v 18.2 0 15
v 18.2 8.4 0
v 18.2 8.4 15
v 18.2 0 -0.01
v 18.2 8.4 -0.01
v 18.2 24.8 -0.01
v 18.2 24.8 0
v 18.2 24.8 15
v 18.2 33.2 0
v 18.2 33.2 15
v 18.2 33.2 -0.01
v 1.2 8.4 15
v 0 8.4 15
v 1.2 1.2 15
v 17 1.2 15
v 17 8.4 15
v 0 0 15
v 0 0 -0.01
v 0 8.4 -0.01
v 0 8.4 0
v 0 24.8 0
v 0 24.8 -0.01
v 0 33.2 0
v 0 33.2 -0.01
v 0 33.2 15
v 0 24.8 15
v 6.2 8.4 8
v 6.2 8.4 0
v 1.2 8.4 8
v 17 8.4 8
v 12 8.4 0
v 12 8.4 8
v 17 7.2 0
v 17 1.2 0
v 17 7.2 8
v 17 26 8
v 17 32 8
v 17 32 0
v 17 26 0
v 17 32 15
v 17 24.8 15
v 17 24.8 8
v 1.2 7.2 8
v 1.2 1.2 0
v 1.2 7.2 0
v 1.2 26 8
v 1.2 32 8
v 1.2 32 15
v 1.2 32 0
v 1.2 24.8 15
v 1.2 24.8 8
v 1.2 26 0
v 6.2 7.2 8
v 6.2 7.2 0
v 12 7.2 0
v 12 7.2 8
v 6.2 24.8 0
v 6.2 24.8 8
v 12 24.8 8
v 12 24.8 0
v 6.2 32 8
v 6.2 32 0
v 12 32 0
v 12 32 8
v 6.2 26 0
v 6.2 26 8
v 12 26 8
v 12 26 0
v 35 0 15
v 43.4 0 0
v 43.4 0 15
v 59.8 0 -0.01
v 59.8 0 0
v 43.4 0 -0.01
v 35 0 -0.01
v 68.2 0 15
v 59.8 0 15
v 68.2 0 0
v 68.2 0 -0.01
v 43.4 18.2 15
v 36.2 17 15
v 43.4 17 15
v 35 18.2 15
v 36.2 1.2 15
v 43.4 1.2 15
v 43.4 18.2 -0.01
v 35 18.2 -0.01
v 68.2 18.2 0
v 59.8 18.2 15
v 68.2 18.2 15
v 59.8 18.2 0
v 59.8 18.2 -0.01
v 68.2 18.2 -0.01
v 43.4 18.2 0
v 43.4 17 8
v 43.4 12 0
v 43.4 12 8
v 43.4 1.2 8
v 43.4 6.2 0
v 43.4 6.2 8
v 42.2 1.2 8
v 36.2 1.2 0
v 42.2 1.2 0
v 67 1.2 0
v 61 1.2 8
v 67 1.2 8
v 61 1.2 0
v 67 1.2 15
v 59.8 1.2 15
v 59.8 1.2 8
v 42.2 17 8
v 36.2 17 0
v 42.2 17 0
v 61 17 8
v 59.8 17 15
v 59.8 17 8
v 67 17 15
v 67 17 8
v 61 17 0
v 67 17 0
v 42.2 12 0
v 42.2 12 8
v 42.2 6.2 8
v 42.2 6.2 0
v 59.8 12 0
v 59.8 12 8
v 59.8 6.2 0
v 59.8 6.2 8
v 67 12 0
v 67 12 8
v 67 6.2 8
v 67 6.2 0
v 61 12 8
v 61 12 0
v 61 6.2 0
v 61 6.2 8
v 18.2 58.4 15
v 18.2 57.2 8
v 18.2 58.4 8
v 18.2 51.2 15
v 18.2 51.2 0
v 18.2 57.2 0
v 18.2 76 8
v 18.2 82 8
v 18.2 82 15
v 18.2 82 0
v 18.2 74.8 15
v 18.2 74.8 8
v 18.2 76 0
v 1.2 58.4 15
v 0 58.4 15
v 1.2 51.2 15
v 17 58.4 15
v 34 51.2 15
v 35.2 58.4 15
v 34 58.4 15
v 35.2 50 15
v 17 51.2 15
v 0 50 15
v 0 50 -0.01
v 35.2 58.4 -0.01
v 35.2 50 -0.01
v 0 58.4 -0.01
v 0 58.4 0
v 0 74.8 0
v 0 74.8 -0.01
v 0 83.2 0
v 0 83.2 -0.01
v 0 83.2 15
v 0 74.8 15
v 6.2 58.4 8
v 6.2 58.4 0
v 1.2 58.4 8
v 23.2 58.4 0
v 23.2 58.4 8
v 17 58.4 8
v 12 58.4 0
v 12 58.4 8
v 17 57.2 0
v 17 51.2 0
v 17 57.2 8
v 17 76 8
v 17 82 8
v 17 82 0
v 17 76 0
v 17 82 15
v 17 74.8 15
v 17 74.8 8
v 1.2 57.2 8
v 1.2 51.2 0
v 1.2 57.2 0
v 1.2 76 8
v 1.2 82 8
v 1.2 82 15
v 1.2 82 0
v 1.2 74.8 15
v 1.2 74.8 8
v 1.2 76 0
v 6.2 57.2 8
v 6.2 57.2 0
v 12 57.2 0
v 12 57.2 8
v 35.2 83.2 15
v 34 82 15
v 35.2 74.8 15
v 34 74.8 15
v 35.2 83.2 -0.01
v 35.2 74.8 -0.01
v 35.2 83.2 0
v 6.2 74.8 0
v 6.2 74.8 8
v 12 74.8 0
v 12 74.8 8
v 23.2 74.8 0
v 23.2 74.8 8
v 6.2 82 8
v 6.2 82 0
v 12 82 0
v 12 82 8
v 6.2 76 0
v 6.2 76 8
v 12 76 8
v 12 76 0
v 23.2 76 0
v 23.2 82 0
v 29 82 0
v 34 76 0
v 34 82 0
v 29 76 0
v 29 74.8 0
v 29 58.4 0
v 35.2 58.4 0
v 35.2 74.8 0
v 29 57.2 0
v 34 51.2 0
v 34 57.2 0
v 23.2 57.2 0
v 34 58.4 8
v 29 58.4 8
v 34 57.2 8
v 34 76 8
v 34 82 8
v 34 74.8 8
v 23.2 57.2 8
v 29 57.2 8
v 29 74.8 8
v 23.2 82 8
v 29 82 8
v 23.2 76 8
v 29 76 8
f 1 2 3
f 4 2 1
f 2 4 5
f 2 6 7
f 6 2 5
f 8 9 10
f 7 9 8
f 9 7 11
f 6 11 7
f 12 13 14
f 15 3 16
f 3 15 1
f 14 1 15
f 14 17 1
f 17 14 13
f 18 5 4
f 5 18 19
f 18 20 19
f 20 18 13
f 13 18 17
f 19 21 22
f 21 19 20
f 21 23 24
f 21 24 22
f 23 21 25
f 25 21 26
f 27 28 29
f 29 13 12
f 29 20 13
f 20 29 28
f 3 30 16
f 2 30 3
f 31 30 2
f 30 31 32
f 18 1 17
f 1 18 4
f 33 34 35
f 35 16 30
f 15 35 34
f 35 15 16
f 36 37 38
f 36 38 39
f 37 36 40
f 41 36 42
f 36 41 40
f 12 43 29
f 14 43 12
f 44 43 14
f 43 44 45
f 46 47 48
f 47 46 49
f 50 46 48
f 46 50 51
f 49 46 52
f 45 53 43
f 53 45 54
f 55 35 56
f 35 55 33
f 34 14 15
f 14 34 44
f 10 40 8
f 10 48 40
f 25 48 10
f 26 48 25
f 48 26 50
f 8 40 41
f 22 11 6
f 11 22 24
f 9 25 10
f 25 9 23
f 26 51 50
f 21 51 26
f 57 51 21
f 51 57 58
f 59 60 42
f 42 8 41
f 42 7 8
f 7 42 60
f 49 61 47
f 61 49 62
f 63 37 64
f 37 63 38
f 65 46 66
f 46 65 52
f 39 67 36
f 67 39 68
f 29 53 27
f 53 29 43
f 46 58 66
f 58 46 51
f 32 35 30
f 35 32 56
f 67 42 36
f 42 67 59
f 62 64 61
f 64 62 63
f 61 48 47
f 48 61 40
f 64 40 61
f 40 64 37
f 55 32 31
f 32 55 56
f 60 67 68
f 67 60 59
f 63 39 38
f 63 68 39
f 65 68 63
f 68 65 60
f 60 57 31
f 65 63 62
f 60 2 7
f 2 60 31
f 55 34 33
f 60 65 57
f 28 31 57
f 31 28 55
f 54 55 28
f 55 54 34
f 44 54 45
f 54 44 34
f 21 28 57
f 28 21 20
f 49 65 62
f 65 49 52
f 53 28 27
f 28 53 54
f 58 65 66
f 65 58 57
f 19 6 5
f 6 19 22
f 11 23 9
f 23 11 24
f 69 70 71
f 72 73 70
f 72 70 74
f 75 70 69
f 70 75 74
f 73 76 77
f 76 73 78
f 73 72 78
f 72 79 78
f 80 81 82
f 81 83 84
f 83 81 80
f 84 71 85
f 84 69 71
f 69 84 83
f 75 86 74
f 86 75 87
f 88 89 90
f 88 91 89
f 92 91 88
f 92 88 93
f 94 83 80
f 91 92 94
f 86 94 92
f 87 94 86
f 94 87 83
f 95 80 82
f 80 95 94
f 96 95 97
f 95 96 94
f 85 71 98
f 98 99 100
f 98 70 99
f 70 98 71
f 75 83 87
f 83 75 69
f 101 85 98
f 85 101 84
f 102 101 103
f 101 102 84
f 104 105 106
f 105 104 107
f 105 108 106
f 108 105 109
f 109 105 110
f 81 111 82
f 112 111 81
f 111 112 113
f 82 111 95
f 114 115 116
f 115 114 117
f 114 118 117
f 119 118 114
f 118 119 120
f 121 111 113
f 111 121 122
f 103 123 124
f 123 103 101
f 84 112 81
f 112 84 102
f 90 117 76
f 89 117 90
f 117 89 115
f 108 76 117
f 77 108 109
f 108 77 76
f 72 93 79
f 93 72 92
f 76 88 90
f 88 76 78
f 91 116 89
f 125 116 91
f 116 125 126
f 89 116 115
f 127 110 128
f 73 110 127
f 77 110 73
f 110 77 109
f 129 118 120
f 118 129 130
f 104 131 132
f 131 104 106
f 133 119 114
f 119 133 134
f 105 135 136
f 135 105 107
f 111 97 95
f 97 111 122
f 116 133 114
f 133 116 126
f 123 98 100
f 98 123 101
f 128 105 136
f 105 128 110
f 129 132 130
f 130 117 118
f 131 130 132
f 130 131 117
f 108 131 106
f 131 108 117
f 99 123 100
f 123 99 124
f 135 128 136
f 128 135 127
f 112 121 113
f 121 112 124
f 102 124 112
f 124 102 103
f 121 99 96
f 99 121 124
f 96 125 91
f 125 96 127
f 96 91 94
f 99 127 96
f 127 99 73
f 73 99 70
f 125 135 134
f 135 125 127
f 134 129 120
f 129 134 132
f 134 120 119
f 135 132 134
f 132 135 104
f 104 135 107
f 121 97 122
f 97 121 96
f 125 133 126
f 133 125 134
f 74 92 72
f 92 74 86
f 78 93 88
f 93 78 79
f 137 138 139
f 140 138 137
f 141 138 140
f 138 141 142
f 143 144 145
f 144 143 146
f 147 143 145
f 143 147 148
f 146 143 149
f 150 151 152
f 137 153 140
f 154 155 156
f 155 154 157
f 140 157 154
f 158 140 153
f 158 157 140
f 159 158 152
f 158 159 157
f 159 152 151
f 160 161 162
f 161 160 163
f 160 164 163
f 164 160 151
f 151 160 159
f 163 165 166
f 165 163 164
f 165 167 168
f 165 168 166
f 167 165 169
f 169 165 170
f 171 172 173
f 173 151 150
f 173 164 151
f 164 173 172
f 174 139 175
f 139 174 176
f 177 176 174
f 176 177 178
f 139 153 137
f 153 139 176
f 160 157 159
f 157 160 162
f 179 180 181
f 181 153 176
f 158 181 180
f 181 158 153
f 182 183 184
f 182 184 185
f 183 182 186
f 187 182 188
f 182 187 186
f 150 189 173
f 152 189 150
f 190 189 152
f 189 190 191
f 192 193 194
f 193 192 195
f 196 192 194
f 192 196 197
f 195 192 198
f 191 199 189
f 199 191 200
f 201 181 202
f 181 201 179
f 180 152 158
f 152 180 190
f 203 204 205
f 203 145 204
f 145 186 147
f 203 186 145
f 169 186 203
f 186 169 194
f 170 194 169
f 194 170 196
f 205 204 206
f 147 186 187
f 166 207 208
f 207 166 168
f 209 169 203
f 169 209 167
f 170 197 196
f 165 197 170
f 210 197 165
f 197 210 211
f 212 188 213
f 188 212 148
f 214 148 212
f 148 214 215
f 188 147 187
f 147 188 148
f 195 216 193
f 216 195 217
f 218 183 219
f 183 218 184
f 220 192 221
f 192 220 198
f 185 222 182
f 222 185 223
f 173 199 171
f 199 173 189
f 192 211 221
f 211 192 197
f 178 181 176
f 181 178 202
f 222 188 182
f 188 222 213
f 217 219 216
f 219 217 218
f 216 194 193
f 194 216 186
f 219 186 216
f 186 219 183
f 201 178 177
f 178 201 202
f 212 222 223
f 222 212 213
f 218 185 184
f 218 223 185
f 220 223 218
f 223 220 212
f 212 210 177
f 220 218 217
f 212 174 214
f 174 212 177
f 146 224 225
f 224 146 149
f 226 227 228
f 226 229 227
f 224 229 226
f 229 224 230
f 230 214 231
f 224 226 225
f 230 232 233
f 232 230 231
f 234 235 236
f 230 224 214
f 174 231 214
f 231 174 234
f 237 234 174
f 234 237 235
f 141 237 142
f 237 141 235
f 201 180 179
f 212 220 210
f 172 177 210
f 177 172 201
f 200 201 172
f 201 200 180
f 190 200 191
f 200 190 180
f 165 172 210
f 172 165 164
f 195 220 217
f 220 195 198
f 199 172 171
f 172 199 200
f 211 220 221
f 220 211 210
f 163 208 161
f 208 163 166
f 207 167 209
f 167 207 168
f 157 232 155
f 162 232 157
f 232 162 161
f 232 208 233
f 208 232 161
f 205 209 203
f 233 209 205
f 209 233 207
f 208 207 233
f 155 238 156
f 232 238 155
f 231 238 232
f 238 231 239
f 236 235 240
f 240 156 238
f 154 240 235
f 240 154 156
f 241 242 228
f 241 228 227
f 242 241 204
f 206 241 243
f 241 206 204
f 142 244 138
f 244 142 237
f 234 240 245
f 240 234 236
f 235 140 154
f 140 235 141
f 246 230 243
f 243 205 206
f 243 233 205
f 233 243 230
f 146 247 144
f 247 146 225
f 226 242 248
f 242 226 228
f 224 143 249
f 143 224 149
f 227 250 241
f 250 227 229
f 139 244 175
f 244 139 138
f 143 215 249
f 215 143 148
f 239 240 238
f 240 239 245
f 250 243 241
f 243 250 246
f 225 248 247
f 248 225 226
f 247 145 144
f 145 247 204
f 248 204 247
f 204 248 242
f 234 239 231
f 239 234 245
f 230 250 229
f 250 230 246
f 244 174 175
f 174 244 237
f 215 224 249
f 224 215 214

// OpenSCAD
// file: ../../Base/Boxes.scad
// Fischertechnik Box Foundation
// Pre-designed Boxes

use <Constants.scad>

include <PlacementOptions.scad>

box190Width = 190;
box190Depth = 130;
box130Width = 130;
box130Depth = 95;
boxUsageHeight = 33.9;
boxWallThickness = 2.4;
boxBaseThickness = 1.0;

// getBoxWallThickness()
// Gets the wall thickness of a Fischertechnik Box

function getBoxWallThickness() = boxWallThickness;

// Gets the usable height of a fischertechnik box
function getBoxUsageHeight() = boxUsageHeight;

// Gets the thickness of the Fischertechnik box base.
function getBoxBaseThickness() = boxBaseThickness;

// Gets the usable inner space of a Box 190 as an x/y-list
function getBox190Space() = [
    box190Width - 2*getBoxWallThickness(), 
    box190Depth - 2*getBoxWallThickness() ];

// Imports the Fischertechnik empty box 130x190 mm and places it at position 0,0
// 190x130 are the outer sizes, the inner space is slightly smaller. Use getBox190Space() to get the inner sizes.
// This module needs the STL file "Fischertechnik Box 130x190.stl" in the library path.
// The box is positioned that the usable inner space is at the 0,0,0 position. The

module Box190() {
    translate([-getBoxWallThickness(),-getBoxWallThickness(),-getBoxBaseThickness()])
        import("Fischertechnik Box 130x190.stl", convexity=3);
}

// Gets the usable inner space of a Box 130 as an x/y-list
function getBox130Space() = [
    box130Width - 2*getBoxWallThickness(), 
    box130Depth - 2*getBoxWallThickness() ];

// Imports the Fischertechnik empty box 95x130 mm and places it at position 0,0
// 190x130 are the outer sizes, the inner space is slightly smaller. Use getBox190Space() to get the inner sizes.
// This module needs the STL file "Fischertechnik Box 95x130.stl" in the library path.
// The box is positioned that the usable inner space is at the 0,0,0 position. The

module Box130() {
    translate([-getBoxWallThickness(),-getBoxWallThickness(),-getBoxBaseThickness()])
        import("Fischertechnik Box 95x130.stl", convexity=3);
}

// Creates a web at the specified box walls
// corner 0 = LowerLeft, 1 = UpperLeft, 2 = UpperRight, 3 = LowerRight
// side 0 = LeftOfCorner, 1 = RightOfCorner
// distance = Distance in mm from the corner
// box = inner width and depth of the box (default: Box 190)
// webWidth = length of the web (default is 3 mms)
// webThickness = thickness of the web (default is 1 mm)

module BoxWeb(corner, side, distance, box=getBox190Space(), webWidth=3, webThickness=1.0) {
    sink = getBoxWallThickness()/2;

    width = (corner % 2 == 0) ? 
            (side == LeftOfCorner ? webWidth : webThickness) :
            (side == LeftOfCorner ? webThickness : webWidth);

    depth = (corner % 2 == 0) ? 
            (side == RightOfCorner ? webWidth : webThickness) :
            (side == RightOfCorner ? webThickness : webWidth);
    
    xDiff = corner == LowerLeft ? 
                (side == LeftOfCorner ? -sink : distance) :
            (corner == UpperLeft ?                
                (side == LeftOfCorner ? distance : -sink) :
            (corner == UpperRight ?
                (side == LeftOfCorner ? box.x-webWidth+sink : box.x-distance-webThickness) :
                (side == LeftOfCorner ? box.x-distance-webThickness: box.x-webWidth+sink)));

    yDiff = corner == LowerLeft ? 
                (side == RightOfCorner ? -sink : distance) :
            (corner == UpperLeft ?
                (side == RightOfCorner ? box.y-distance : box.y-webWidth+sink) :
            (corner == UpperRight ?
                (side == RightOfCorner ? box.y-webWidth+sink : box.y-distance) :
                (side == RightOfCorner ? distance : -sink)));
    
    translate([xDiff, yDiff, -getExcess()])
        cube([width, depth, boxUsageHeight + 2*getExcess()]);
}
// file: ../../Base/Rotation.scad
// Fischertechnik Box Foundation
// Geometry Helpers Rotation

include <PlacementOptions.scad>

// getRotatedSpace(space, rotation=NoRotation)
// Rotates the space dependent on the specified rotation

function getRotatedSpace(space, rotation=NoRotation) = [
    (rotation == Rotate90 || rotation == Rotate270) ? space.y : space.x,
    (rotation == Rotate90 || rotation == Rotate270) ? space.x : space.y
];

// Rotates the given space around the fixed left lower corner
// space = the space the children needs as width/depth list [width,depth]
// rotation = 0 Rotate0 degrees, 1 Rotate90 degrees, 2 Rotate180 degrees, 3 Rotate270 degrees (equivalent to -90)

module RotateFix(space, rotation=Rotate0) {
    dy = (rotation == Rotate0 || rotation == Rotate270) ? 0 :
        (rotation == Rotate90) ? space.x :
        space.y;
    dx = (rotation < Rotate180) ? 0 :
        (rotation == Rotate180) ? space.x :
        space.y;
    
    translate([dx, dy, 0])
        rotate([0, 0, rotations[rotation]])
            children();
}
// file: ../../Base/Alignment.scad
// Fischertechnik Box Foundation
// Geometry Helpers Alignment

include <PlacementOptions.scad>

// getAlignedX(elementWidth, spaceWidth, align=AlignRight, offset=0)
// Gets the aligned X offset of an element with the given
// width in the given space.
// elementWidth = The width of the element to positon
// spaceWidth = The space where the element should be aligned
// align = 0 AlignLeft, 1 AlignCenter, 2 AlignRight
// offset = an optional offset from the aligned position. When
// aligned left or centered, then positive values are in X direction.
// When aligned right then positive values are in negative X direction.

function getAlignedX(elementWidth, spaceWidth, align=AlignRight, offset=0) =
    (align == AlignLeft) ?
        offset :
        ((align == AlignCenter) ?
        (spaceWidth - elementWidth)/2 + offset :
        spaceWidth - offset - elementWidth);

// getAlignedY(elementDepth, spaceDepth, align=AlignTop, offset=0)
// Gets the aligned Y offset of an element with the given
// depth in the given space.
// elementDepth = The depth of the element to positon
// spaceDepth = The space where the element should be aligned
// align = 0 AlignBottom, 1 AlignCenter, 2 AlignTop
// offset = an optional offset from the aligned position. When
// aligned bottom or centered, then positive values are in Y direction.
// When aligned top then positive values are in negative Y direction.

function getAlignedY(elementDepth, spaceDepth, align=AlignTop, offset=0) =
    (align == AlignBottom) ?
        offset :
        ((align == AlignCenter) ?
        (spaceDepth - elementDepth)/2 + offset :
        spaceDepth - offset - elementDepth);
// file: ../../Base/Constants.scad
// Fischertechnik Box Foundation
// Constants

// Constant values necessary for multiple elements

// Base constants
dividerThickness = 1.2;
excess = 0.01;
fragments = 90;
tolerance = 0.8;

// Gets the thickness of a divider 
function getDividerThickness() = dividerThickness;

// Gets the excess that is used to merge walls into each other
function getExcess() = excess;

// Gets amount of fragments of a cylinder
function getFragments() = fragments;

// Gets the inner tolerance of a frame to each side
function getTolerance() = tolerance;


// Fischertechnik specific constants
axisDiameter = 4;
axisBottomDiameter = axisDiameter + 1;
standardEdgeDistance = 2.5;
standardWebDistance = 11.5;
standardCornerLength = 15;
tubeWallFactor = 1.6;

// Gets axis diameter
function getAxisDiameter() = axisDiameter;

// Gets axis bottom diameter for thicker part at the bottom
function getAxisBottomDiameter() = axisBottomDiameter;

// gets the standard distance to the wall of the box for dockable frames with webs
function getStandardEdgeDistance() = standardEdgeDistance;

// gets the standard distance of each web to the corner of the dockable frame
function getStandardWebDistance() = standardWebDistance;

// gets the standard length of the corner walls of a dockable frame
function getStandardCornerLength() = standardCornerLength;

// gets the wall thickness of a tube.
function getTubeWallThickness() = tubeWallFactor * getDividerThickness();
// file: ../../Base/PlacementOptions.scad
// Fischertechnik Box Foundation
// Placement Options

// Alignment
NoAlign = 0;
AlignLeft = 1;
AlignBottom = 2;
AlignCenter = 3;
AlignRight = 4;
AlignTop = 5;

// Element rotation degree steps
rotations = [0, -90, -180, -270];

// Rotation
NoRotation = 0;
Rotate0 = 0;
Rotate90 = 1;
Rotate180 = 2;
Rotate270 = 3;

// Docking (seen from above)
NoDock = -1;
DockLeft = 0;
DockTop = 1;
DockRight = 2;
DockCorner = 2;
DockBottom = 3;

// Web corners
LowerLeft = 0;
UpperLeft = 1;
UpperRight = 2;
LowerRight = 3;

// Web position relative to corner
LeftOfCorner = 0;
RightOfCorner = 1;
// file: ../../Elements/FramePlaneMirror.scad
// Fischertechnik Box Library
// Frame for Plane Mirror
// 31368 

use <../ModelBase/Simple.scad>
use <../ModelBase/Complex.scad>

width = 15;
depth = 30;
height = 8.0;

// getFramePlaneMirrorSpace()
// Gets the outer space the aperture frame needs.

function getFramePlaneMirrorSpace() = getFrameOuterVolume([width, depth, height]);

// FramePlaneMirror()
// Frame for a 15x30 mm plane mirror.

module FramePlaneMirror() {
    
    FrameSpecialFlat([width, depth, height]);
}

// Tests
color("lightgray") {
    FramePlaneMirror();
}
// file: ../../Base/Deployment.scad
// Fischertechnik Box Foundation
// Geometry Helpers Deployment

use <Constants.scad>
use <Placement.scad>
use <Rotation.scad>

include <PlacementOptions.scad>

// getWidth(spaces, rotations, count, i=0)
// Gets the sum of the width of count specified spaces, including rotations for each space.
// spaces = List of spaces from which the width should be added. Used internally for DeployRow.
// rotations = specify rotations for each space to get its correct width
// count = The count of spaces from the specified spaces that should be included in the sum (for recursive call)
// i = The space index offset used to start to add (for recursive call)

function getWidth(spaces, rotations, count, i=0) = 
    (i < count) ? 
        getRotatedSpace(spaces[i], rotations[i]).x + getWidth(spaces, rotations, count, i+1) : 
        0;

// getX(spaces, rotations, distance, i)
// Calculates the X position of the space with the index i, when the spaces are placed with the given
// equal distances. Used internally for DeployRow.
// spaces = List of spaces from which the width should be added
// rotations = specify rotations for each space to get its correct width
// distance = Equal distance between each space
// i = Index of the space to get its X position for

function getX(spaces, rotations, distance, i) = 
    (i == 0) ? 
        0 :
        (getRotatedSpace(spaces[i-1], rotations[i-1]).x + distance + getX(spaces, rotations, distance, i-1));

// DeployRow(width, spaces, rotations)
// Deploys the elements in the specified width with equal distances.
// rowWidth = The width of the row in mm.
// spaces = The spaces of all elements to deploy.
// rotations = The rotations of each element: 0 Rotate0 0 degrees, 1 Rotate90 90 degrees, 
// 2 Rotate180 180 degrees, 3 Rotate270 270 degrees (equivalent to -90).

module DeployRow(rowWidth, spaces, rotations) {
    distance = (rowWidth - getWidth(spaces, rotations, len(spaces))) / (len(spaces)-1);
    
    for (i = [0:1:$children-1]) {
        x = getX(spaces, rotations, distance, i);
        translate([x, 0])
            RotateFix(spaces[i], rotations[i])
                children(i);
    }
}

// DeploySame(space, elementSpace, columns=2, rows=1, rotation=Rotate0)
// Deploys columns and rows of the specified child in the specified space with
// equal distances
// space = The space where the element copies are deployed
// elementSpace = The space the child needs
// columns = Count of elements per row
// rows = Count of rows deployed
// rotation = The rotation of the child that will be applied

module DeploySame(space, elementSpace, columns=2, rows=1, rotation=Rotate0) {
    
    elementWidth = getRotatedSpace(elementSpace, rotation).x;
    columnDistance = (space.x - columns * elementWidth) / (columns > 1 ? columns - 1 : 1);
    endColumnOffset = space.x - elementWidth;
    columnOffsetStep = elementWidth + columnDistance;
    
    elementDepth = getRotatedSpace(elementSpace, rotation).y;
    rowDistance = (space.y - rows * elementDepth) / (rows > 1 ? rows - 1 : 1);
    endRowOffset = space.y - elementDepth;
    rowOffsetStep = elementDepth + rowDistance;
    
    for (rowOffset = [0:rowOffsetStep:endRowOffset]) {
        for (columnOffset = [0:columnOffsetStep:endColumnOffset]) {
            translate([columnOffset, rowOffset])
                RotateFix(elementSpace, rotation)
                    children(0);
        }
    }
}

// getMergedRowWidth(spaces, rotations, count, i=0)
// Gets the width of the merged spaces with the specified rotations.
// Merging works all elements with two frame walls. 
// The right and left walls are merged into one single wall.
// spaces = List of spaces from which the width should be added.
// rotations = specify rotations for each space to get its correct width
// count = The count of spaces from the specified spaces that should be included in the sum (for recursive call)
// i = The space index offset used to start to add (for recursive call)

function getMergedRowWidth(spaces, rotations, count, i=0) =
    (i < count) ? 
        getRotatedSpace(spaces[i], rotations[i]).x + getWidth(spaces, rotations, count, i+1) - (i > 0 ? getDividerThickness() : 0) : 
        0;

// MergeRow(spaces, rotations, dividerThickness=0.8)
// Deploys the children so that all walls of the neighbors are merged in a single common wall.
// spaces = List of spaces of the children to get the sizes from.
// rotations = specify rotations for each space to get its correct width
// dividerThickness = Thickness of all dividers of the elements (default is 0.8)

module MergeRow(spaces, rotations, dividerThickness = getDividerThickness()) {
    for (i = [0:1:$children-1]) {
        x = getX(spaces, rotations, -getDividerThickness(), i);
        translate([x, 0, 0])
            RotateFix(spaces[i], rotations[i])
                children(i);
    }
}

// Merge(count, space, rotation, dividerThickness=0.8)
// Deploys the child count times so that all walls of the neighbors are merged in a single common wall.
// space = Space of the child to get the sizes from.
// rotation = rotation of the child to get the correct width
// dividerThickness = Thickness of all dividers of the element (default is 0.8)

module Merge(count, space, rotation, dividerThickness = getDividerThickness()) {
    x = getRotatedSpace(space, rotation).x - getDividerThickness();
    for (offset = [0:x:(count-1)*x]) {
        echo(offset);
        translate([offset, 0, 0])
            RotateFix(space, rotation)
                children(0);
    }
}
// file: ../../Base/Placement.scad
// Fischertechnik Box Foundation
// Geometry Helpers Placement

use <Constants.scad>
use <Alignment.scad>
use <Rotation.scad>
use <Boxes.scad>

include <PlacementOptions.scad>

// Place(x=0, y=0, elementSpace=[0,0], alignX=AlignLeft, alignY=AlignBottom, rotation=Rotate0, boxSpace=getBox190Space())
// Places the child at the specified position
// y = Y-Position. This is a relative position when an X aligment is specified.
// x = X-Position. This is a relative position when an Y aligment is specified.
// elementSpace = space of the element to be placed [x,y]
// alignX = -1=NoAlign, 0 AlignLeft, 1 AlignCenter, 3 AlignRight (elementSpace and boxSpace required!)
// alignY = -1=NoAlign, 2 AlignBottom, 1 AlignCenter, 4 AlignTop (elementSpace and boxSpace required!)
// rotation = 0 Rotate0 0 degrees, 1 Rotate90 90 degrees, 
// 2 Rotate180 180 degrees, 3 Rotate270 270 degrees (equivalent to -90)
// boxSpace = Inner space of the box where the placement occurs [x,y] - default is Box 190x130 inner space

module Place(x=0, y=0, elementSpace=[0,0], 
  alignX=AlignLeft, alignY=AlignBottom, 
  rotation=NoRotation, boxSpace=getBox190Space()) {

    module Position(x, y, space, rotation=Rotate0) {
        translate([x, y, 0])
            RotateFix(space, rotation)
                children(0);
    }

    space = getRotatedSpace(elementSpace, rotation);
    alignedX = getAlignedX(space.x, boxSpace.x, alignX, x);
    alignedY = getAlignedY(space.y, boxSpace.y, alignY, y);
    Position(alignedX, alignedY, elementSpace, rotation)
        children(0);
}

// Center(space=getBox130Space(), elementSpace=[0,0])
// space = Space where the children is centered. For cylinder use centered=true and no elementSpace.
// elementSpace = space of the element to be centered [x,y]

module Center(space=getBox190Space(), elementSpace=[0,0]) {
    translate([(space.x - elementSpace.x) / 2, (space.y - elementSpace.y) / 2])
        children(0);
}

// CenterHorizontal(width=0, y=0, offset=0, space=getBox130Space())
// space = Space where the children is centered. For cylinder use centered=true and no elementSpace.
// elementSpace = space of the element to be centered [x,y]

module CenterHorizontal(width=0, y=0, offset=0, space=getBox190Space()) {
    translate([(space.x - width) / 2 + offset, y])
        children(0);
}

// CenterVertical(depth=0, x=0, offset=0, space=getBox130Space())
// space = Space where the children is centered. For cylinder use centered=true and no elementSpace.
// elementSpace = space of the element to be centered [x,y]

module CenterVerticalal(depth=0, x=0, offset=0, space=getBox190Space()) {
    translate([x, (space.y - depth) / 2 + offset])
        children(0);
}
// main file
// Fischertechnik Box Foundation
// Elements
// Test FramePlaneMirror

use <../../Base/Placement.scad>
use <../../Base/Deployment.scad>
use <../../Elements/FramePlaneMirror.scad>

include <../../Base/PlacementOptions.scad>

FramePlaneMirror();

Place(35, 0, getFramePlaneMirrorSpace(), rotation=Rotate90)
    FramePlaneMirror();

translate([0, 50])
    Merge(2, getFramePlaneMirrorSpace(), Rotate0)
        FramePlaneMirror();
